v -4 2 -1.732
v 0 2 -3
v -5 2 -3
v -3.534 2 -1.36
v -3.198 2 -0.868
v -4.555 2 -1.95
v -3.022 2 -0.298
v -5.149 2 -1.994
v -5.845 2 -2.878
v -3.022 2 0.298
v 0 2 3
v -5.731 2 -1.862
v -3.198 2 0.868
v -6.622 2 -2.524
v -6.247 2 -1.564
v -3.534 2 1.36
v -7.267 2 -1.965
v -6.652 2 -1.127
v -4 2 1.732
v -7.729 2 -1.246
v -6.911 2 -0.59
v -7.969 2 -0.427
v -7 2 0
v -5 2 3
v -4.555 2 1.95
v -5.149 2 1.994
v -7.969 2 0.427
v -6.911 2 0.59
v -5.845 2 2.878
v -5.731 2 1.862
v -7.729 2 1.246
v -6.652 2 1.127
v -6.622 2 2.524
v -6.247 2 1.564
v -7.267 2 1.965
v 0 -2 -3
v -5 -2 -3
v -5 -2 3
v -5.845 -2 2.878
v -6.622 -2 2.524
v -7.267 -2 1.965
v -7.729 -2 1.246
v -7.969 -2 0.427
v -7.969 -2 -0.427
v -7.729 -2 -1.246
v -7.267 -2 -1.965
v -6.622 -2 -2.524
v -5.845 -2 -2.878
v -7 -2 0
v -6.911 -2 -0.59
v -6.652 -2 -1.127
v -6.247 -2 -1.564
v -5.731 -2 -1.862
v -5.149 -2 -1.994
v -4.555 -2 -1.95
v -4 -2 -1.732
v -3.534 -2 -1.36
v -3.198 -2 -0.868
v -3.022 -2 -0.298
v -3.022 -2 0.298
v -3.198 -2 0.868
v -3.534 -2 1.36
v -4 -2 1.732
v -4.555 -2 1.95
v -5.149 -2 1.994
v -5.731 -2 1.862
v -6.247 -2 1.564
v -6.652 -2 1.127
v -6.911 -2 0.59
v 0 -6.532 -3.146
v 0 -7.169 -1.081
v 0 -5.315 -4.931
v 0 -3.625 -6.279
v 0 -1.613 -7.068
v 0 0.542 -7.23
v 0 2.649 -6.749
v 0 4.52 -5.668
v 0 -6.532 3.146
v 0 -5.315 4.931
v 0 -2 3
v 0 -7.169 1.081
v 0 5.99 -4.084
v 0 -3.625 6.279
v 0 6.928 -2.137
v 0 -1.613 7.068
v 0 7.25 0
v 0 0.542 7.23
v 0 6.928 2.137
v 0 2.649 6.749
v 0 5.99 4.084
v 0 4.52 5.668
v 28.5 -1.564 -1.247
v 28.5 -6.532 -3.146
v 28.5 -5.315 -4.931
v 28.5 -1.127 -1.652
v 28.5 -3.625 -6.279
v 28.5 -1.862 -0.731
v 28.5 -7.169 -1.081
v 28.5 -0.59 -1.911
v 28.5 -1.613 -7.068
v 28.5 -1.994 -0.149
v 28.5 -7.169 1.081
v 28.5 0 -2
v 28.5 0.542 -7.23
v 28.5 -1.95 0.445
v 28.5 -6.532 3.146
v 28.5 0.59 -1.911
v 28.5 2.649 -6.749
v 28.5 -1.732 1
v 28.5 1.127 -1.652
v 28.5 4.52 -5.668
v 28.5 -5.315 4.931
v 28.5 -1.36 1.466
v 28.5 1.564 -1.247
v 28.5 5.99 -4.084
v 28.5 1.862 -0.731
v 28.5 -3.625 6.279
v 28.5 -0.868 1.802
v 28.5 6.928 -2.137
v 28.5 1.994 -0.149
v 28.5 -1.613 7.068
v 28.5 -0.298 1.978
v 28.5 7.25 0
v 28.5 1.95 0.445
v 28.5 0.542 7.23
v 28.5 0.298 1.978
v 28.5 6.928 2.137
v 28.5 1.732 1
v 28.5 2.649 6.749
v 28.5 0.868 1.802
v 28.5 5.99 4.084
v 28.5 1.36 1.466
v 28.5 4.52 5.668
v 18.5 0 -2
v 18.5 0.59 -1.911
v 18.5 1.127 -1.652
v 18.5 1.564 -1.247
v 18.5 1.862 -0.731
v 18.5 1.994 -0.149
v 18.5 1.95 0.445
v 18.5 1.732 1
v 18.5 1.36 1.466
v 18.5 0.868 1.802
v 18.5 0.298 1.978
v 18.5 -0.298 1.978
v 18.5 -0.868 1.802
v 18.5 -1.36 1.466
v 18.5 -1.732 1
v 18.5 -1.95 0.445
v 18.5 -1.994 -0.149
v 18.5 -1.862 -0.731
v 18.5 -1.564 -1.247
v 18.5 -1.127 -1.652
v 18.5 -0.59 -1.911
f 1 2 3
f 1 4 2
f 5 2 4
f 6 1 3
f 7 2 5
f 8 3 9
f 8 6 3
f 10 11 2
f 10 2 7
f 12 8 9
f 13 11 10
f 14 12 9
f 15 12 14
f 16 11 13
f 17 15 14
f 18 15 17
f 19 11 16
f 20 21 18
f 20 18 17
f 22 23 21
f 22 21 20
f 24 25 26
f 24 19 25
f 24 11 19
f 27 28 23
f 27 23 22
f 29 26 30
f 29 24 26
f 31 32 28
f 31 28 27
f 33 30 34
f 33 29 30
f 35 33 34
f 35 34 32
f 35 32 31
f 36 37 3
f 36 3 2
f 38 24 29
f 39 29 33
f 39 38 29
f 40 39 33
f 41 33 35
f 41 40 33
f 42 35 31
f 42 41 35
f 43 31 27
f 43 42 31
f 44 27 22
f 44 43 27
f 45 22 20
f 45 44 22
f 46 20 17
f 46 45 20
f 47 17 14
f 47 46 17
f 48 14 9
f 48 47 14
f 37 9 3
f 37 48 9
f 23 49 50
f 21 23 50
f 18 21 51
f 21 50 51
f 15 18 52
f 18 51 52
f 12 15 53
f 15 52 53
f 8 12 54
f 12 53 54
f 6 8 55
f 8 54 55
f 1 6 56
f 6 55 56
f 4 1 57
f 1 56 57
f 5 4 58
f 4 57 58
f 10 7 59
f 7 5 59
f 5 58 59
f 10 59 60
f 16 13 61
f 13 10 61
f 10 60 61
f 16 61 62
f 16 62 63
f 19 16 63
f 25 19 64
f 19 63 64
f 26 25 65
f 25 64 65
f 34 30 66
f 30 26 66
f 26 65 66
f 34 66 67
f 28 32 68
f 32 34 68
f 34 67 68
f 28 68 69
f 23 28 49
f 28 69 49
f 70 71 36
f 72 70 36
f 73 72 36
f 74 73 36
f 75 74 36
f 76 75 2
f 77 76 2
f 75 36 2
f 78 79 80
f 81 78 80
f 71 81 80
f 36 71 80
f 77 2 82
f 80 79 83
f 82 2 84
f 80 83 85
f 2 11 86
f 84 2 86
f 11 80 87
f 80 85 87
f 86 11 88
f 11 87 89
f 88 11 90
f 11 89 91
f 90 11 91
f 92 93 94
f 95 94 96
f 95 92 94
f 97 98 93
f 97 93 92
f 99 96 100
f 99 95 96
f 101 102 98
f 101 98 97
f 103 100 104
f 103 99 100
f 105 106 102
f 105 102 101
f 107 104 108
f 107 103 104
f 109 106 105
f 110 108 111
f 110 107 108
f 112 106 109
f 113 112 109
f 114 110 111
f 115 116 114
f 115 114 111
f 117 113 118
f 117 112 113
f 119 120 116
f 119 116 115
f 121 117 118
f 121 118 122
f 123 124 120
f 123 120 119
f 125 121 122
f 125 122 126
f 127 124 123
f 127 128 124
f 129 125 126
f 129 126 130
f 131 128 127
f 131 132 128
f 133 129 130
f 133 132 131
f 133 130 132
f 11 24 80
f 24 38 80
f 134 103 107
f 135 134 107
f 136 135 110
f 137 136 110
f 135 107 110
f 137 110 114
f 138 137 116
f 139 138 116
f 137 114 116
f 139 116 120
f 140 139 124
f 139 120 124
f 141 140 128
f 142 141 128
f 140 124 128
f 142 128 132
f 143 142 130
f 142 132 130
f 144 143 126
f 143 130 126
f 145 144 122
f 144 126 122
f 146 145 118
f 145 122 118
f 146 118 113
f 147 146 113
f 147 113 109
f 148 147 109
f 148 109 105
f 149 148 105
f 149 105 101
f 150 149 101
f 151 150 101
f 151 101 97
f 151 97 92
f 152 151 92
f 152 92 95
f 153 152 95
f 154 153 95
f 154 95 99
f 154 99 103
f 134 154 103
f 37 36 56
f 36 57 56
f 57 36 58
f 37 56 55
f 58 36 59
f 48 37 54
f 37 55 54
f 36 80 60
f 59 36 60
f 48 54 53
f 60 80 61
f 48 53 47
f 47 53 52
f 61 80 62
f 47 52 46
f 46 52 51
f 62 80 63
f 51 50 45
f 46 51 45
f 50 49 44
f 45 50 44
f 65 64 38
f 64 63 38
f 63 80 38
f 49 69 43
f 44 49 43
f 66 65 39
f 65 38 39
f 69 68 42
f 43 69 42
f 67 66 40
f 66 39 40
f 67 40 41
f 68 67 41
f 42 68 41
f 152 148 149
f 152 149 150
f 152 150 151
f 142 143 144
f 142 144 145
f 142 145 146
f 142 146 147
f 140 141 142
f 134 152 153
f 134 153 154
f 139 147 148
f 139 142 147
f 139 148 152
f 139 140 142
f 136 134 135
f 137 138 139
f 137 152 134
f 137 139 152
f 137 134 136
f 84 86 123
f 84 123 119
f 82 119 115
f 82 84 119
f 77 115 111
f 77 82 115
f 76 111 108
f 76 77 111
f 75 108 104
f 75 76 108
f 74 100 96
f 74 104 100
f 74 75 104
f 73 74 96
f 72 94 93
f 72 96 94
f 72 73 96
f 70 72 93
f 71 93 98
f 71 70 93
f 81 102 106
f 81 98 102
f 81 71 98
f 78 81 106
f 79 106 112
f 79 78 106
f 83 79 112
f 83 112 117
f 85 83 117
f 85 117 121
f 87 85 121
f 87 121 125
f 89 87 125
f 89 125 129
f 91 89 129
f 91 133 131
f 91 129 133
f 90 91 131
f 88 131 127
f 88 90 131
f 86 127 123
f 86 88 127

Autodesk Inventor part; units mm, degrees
ref_plane "YZ Plane" through (0, 0, 0) normal (1, 0, 0) x (0, 1, 0)
ref_plane "XZ Plane" through (0, 0, 0) normal (0, 1, 0) x (-1, 0, 0)
ref_plane "XY Plane" through (0, 0, 0) normal (0, 0, 1) x (1, 0, 0)
sketch "スケッチ1" plane through (0, 0, 0) normal (1, 0, 0) x (0, 1, 0)
  circle A0 centre (0, 0) radius 7.25
  dimension "d0" = 14.5
extrude "押し出し1" add sketch "スケッチ1" along normal blind 28.5
sketch "スケッチ2" plane through (0, 0, 0) normal (0, 1, 0) x (-1, 0, 0)
  circle A0 centre (5, 0) radius 2
  circle A1 centre (5, 0) radius 3
  line L0 (5, -3) -> (0, -3)
  line L1 (0, 7.25) -> (0, -7.25) projected
  line L2 (5, 3) -> (0, 3)
  point P0 (0, 0)
  dimension "d3" = 4
  dimension "d4" = 5
  dimension "d5" = 6
extrude "押し出し2" add sketch "スケッチ2" along normal mid plane 4
sketch "スケッチ3" plane through (28.5, 0, 0) normal (1, 0, 0) x (0, 0, -1)
  circle A0 centre (0, 0) radius 2
  dimension "d8" = 4
extrude "押し出し3" cut sketch "スケッチ3" against normal blind 10
properties part number "pink-suspension-under" material "ABS プラスチック"
